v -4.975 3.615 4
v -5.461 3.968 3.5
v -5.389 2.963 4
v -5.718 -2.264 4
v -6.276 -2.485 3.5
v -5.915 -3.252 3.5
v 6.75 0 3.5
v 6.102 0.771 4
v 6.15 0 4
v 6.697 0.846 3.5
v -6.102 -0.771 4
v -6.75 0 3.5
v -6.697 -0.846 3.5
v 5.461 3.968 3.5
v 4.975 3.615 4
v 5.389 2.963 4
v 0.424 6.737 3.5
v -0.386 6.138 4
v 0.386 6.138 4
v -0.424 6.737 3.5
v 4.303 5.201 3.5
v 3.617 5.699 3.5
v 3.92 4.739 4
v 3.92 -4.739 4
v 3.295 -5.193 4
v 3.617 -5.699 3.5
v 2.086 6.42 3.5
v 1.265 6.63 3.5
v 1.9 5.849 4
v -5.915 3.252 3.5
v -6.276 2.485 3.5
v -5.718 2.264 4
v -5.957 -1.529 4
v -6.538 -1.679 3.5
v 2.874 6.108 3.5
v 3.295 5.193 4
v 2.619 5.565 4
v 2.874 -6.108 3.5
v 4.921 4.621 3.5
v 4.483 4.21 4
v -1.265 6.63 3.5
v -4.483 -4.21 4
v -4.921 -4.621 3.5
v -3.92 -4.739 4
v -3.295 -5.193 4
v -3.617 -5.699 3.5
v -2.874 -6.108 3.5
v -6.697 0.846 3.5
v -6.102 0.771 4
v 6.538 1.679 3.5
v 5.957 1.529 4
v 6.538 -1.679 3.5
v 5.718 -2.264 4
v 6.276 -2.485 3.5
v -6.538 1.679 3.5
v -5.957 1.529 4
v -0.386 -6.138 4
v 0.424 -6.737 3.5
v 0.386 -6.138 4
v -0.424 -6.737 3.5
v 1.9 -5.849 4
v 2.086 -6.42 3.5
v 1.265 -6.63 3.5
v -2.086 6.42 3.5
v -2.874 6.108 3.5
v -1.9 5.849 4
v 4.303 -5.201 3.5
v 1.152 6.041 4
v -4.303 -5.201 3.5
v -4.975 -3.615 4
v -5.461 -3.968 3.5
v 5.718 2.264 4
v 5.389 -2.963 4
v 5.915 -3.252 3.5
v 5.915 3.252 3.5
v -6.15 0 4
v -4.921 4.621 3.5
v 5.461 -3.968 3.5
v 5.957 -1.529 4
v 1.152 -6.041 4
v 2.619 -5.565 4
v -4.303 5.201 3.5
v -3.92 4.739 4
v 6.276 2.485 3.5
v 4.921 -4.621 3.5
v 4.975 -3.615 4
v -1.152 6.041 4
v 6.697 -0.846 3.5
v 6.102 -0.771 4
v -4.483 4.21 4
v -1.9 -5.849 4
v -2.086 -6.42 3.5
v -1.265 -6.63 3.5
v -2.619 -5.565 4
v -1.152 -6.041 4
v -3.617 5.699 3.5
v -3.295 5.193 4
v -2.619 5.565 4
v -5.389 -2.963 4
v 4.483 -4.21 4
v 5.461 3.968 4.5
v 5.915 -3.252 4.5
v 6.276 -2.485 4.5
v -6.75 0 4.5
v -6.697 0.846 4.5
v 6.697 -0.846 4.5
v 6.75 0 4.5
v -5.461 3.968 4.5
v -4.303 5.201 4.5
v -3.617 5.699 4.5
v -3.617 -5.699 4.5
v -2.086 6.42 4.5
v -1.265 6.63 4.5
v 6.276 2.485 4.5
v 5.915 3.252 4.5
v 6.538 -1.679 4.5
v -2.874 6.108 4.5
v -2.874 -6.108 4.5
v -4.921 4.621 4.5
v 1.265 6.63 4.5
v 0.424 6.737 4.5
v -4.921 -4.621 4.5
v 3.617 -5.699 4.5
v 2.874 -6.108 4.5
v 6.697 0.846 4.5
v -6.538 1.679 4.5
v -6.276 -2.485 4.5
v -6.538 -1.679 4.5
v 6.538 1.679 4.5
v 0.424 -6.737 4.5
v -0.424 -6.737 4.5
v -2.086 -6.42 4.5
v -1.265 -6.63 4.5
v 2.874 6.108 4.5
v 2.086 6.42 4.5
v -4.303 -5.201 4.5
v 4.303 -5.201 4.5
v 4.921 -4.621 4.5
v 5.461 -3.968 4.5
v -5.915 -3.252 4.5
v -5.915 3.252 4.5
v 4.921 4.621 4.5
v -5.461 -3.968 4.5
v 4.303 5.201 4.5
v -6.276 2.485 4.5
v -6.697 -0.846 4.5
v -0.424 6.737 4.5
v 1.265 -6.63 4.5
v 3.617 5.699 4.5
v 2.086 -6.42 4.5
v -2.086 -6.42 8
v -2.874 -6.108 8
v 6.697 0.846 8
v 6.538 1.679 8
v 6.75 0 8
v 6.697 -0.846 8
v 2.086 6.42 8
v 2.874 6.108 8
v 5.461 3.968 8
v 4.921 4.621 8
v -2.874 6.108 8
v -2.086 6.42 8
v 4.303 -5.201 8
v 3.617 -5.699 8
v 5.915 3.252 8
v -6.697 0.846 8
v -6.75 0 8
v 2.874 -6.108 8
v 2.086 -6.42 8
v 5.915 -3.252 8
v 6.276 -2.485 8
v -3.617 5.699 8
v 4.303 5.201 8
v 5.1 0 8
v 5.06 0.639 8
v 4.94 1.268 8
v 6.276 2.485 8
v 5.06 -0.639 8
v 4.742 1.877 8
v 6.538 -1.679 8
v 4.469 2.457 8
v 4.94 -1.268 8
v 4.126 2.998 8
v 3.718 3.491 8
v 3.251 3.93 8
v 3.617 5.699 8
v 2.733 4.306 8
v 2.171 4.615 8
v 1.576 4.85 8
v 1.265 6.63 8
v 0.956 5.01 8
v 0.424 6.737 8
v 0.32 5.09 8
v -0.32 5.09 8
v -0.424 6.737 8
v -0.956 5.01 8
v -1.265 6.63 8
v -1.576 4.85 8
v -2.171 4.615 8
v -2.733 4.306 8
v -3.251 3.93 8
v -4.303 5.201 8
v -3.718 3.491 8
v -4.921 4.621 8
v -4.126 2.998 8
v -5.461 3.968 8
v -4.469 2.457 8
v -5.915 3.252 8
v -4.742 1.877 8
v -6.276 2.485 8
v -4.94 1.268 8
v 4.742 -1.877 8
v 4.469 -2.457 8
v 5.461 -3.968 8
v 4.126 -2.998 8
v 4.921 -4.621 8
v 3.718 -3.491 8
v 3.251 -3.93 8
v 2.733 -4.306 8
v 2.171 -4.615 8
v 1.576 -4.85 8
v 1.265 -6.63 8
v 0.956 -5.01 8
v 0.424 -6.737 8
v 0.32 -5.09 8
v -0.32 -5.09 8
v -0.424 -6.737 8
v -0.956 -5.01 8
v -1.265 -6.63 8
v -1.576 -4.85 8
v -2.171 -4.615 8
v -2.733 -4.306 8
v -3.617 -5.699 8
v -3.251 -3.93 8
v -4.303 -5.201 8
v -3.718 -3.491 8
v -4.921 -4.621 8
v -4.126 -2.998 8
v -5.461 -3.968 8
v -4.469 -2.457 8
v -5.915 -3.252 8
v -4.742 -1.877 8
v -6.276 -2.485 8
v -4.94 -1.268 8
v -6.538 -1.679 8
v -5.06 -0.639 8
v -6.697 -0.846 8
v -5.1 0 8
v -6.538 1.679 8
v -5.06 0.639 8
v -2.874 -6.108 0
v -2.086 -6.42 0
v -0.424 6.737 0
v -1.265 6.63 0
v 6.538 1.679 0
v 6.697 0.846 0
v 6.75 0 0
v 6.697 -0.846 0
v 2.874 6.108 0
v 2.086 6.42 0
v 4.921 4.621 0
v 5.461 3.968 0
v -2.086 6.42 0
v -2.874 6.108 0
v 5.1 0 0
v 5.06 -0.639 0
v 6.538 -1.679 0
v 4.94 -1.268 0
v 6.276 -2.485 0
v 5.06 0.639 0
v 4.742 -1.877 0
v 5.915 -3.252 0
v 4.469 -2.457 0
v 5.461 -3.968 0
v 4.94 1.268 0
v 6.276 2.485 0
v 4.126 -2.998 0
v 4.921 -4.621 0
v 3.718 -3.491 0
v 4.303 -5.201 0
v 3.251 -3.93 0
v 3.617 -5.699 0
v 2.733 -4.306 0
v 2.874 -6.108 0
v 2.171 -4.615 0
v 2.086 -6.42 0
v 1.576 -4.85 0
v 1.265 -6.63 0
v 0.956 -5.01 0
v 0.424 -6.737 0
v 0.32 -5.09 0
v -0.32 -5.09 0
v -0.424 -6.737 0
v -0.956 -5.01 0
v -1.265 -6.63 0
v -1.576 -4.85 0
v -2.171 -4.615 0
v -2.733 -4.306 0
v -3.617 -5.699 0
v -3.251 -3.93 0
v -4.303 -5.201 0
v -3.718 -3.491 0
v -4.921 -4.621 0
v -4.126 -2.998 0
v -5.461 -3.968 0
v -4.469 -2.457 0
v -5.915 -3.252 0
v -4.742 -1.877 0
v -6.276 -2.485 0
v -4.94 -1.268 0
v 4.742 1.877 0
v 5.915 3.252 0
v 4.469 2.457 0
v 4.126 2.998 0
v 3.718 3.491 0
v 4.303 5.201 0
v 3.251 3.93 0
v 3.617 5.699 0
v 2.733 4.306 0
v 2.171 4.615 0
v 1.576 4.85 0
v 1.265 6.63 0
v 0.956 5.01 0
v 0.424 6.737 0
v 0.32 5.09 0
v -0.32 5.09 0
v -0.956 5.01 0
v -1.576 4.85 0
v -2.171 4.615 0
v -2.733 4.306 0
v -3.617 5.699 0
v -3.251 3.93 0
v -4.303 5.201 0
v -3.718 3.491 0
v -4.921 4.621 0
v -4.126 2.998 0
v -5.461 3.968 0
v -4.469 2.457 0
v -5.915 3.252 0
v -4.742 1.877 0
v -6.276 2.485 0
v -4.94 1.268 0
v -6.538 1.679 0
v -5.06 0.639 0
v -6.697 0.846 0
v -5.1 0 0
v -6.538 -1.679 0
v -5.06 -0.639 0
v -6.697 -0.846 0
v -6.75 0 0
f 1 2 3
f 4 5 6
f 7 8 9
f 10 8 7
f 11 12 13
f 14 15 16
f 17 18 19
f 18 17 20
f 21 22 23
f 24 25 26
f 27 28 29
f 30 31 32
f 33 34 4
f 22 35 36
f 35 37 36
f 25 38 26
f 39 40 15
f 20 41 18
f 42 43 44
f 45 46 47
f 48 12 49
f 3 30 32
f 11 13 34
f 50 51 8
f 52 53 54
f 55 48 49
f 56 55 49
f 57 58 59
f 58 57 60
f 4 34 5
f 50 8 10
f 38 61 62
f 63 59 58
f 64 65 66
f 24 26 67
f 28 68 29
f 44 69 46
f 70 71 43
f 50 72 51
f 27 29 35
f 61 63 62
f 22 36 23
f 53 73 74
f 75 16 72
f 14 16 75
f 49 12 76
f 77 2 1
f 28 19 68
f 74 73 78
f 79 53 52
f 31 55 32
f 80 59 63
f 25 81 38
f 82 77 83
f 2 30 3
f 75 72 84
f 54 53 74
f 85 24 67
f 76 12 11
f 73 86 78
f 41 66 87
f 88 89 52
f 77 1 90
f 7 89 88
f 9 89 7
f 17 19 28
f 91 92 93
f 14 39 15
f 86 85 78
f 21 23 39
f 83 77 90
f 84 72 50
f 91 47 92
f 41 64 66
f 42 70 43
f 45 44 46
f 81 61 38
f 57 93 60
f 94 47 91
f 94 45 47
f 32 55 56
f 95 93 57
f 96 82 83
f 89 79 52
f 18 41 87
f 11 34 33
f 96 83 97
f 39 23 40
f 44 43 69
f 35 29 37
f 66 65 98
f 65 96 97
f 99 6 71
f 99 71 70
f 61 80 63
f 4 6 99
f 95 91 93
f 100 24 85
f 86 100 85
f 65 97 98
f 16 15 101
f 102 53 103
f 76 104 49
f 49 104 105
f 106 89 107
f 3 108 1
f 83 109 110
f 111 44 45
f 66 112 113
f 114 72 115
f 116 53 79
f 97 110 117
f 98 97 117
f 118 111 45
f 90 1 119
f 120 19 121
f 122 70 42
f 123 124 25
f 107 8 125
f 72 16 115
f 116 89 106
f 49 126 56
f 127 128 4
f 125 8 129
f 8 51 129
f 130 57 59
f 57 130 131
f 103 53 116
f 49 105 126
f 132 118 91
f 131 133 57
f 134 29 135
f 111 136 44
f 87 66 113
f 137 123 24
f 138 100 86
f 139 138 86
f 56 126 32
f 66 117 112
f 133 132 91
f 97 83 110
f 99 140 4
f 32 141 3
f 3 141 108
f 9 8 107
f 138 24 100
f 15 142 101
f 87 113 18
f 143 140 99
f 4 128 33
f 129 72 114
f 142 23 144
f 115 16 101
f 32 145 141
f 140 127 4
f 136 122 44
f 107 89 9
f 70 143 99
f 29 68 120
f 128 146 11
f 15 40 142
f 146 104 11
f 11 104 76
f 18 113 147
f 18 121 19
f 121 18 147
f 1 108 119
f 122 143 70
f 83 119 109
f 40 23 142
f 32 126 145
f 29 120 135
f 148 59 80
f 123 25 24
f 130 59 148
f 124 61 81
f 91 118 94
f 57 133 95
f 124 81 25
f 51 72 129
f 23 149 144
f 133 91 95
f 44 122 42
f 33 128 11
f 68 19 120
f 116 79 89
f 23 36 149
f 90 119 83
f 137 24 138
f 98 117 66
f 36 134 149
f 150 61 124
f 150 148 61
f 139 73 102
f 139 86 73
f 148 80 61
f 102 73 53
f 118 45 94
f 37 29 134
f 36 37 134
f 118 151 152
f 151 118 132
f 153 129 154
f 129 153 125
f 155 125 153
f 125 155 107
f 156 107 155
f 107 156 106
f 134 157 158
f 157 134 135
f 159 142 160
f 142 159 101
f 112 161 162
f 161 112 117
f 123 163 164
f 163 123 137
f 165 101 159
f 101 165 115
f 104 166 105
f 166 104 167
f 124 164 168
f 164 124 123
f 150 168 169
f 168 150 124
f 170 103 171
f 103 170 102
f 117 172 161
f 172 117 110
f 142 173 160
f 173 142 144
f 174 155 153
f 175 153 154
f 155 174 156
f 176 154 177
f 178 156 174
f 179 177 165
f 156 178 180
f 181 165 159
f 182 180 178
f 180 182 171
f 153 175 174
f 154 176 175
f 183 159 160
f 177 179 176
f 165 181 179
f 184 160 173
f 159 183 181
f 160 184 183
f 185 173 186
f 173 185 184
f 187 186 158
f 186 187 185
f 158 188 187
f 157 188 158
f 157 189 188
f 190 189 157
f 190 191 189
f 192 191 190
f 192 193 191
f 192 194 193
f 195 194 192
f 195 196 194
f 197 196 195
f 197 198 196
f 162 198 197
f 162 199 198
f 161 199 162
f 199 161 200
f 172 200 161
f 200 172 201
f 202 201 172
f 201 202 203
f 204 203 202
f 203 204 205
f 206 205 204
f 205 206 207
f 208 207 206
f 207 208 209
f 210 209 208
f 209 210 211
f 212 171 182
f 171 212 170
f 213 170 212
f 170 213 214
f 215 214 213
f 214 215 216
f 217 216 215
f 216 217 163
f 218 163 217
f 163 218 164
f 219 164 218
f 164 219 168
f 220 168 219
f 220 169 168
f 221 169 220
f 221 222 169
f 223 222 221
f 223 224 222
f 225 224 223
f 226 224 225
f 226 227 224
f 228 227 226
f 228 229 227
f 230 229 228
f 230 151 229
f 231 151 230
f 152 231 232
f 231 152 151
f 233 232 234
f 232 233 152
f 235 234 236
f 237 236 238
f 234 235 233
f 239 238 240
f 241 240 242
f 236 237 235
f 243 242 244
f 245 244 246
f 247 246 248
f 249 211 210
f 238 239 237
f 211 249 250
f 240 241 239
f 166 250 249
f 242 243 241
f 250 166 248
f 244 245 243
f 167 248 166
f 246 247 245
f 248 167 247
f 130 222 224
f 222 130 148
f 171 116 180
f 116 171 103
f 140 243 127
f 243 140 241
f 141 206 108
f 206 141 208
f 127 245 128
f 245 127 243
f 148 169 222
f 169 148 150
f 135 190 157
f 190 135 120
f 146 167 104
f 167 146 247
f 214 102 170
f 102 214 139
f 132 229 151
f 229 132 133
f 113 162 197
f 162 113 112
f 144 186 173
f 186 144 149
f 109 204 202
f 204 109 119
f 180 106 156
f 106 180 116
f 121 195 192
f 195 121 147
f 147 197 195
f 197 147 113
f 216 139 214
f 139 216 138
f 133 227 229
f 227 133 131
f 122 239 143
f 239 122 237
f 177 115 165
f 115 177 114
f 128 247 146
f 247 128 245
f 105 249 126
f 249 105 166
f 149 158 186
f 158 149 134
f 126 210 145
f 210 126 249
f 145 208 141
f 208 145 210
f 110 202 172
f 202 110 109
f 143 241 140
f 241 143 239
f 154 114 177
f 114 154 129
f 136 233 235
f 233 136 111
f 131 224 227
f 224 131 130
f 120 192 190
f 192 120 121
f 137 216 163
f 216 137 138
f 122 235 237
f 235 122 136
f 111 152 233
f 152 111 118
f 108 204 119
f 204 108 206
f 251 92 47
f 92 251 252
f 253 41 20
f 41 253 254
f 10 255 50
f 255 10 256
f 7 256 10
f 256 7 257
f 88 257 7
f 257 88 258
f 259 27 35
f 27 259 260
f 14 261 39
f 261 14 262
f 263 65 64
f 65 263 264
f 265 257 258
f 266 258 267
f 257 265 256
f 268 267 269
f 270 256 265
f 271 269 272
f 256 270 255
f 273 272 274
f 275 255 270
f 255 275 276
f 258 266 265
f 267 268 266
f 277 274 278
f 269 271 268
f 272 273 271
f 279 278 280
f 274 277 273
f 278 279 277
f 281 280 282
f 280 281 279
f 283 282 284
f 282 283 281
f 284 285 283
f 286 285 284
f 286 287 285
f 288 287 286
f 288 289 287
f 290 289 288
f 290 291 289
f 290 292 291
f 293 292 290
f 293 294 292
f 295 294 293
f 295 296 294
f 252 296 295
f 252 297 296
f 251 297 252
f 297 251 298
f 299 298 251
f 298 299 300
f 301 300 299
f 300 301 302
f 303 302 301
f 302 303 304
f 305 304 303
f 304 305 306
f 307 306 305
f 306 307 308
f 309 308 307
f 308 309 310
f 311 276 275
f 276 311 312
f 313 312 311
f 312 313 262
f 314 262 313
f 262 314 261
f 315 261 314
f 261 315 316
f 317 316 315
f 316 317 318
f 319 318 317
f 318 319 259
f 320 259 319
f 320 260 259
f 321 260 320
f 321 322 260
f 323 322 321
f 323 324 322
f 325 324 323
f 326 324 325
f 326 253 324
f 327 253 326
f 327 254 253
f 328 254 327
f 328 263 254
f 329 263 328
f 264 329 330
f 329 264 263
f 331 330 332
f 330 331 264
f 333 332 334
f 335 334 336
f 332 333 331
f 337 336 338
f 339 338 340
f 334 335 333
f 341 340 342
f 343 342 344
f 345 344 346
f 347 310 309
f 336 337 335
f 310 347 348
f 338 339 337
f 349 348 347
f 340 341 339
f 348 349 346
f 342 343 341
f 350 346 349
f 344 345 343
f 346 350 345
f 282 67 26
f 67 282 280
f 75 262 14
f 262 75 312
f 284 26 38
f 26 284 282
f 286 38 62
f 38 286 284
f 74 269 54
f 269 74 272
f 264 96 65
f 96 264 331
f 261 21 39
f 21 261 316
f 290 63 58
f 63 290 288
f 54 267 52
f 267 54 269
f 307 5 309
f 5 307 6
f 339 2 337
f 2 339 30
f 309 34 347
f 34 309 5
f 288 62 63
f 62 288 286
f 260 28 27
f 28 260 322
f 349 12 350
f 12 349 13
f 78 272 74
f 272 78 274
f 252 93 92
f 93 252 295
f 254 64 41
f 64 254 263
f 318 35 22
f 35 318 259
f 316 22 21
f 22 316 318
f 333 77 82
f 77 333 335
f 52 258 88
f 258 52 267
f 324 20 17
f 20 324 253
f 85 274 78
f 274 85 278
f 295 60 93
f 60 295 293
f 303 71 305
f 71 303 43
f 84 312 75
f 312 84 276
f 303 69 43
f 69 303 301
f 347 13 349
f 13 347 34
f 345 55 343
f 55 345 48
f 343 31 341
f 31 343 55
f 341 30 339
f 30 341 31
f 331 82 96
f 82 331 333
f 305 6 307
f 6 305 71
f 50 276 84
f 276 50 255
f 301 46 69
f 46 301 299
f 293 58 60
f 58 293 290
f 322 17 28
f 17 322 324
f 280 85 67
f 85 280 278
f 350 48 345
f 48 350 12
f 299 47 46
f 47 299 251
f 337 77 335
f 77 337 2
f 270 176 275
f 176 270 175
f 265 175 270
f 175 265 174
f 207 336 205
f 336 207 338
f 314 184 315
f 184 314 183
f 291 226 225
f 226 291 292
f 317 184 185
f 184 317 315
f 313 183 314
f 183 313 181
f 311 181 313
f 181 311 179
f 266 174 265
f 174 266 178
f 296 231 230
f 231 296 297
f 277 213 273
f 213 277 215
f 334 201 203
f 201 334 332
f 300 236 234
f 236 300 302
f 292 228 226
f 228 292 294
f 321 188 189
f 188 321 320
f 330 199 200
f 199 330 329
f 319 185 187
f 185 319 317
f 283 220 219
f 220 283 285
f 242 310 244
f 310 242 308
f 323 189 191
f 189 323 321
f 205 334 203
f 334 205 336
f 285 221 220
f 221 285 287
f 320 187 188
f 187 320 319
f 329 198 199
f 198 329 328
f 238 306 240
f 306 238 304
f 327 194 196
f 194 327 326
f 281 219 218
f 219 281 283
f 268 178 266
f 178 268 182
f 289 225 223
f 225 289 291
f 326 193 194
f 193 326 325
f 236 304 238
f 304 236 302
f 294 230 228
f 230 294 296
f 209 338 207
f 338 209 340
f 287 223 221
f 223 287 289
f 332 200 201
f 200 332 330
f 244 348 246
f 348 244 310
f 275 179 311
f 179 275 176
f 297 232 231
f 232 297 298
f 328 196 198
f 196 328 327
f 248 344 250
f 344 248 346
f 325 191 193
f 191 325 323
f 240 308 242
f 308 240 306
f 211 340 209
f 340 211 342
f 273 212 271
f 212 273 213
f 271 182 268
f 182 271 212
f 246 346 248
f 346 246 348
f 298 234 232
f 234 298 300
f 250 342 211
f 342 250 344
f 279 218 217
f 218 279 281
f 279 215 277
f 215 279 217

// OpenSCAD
outerDia = 13.5;

innerDia = 10.2;

grooveDia = 12.3;

grooveHeight = 1;

overallHeight = 8;

module pulley(outerDia, innerDia, midDia, midHeight, height){
    difference(){
        union(){
            translate([0,0,(height-midHeight)/2]) cylinder(h=midHeight/2, r1=outerDia/2, r2=midDia/2,$fn=50);
            translate([0,0,midHeight+(height-midHeight)/2]) rotate([0,180,0]) cylinder(h=midHeight/2, r1=outerDia/2, r2=midDia/2,$fn=50);
            translate([0,0,midHeight+(height-midHeight)/2]) cylinder(h=(height-midHeight)/2, r=outerDia/2,$fn=50);
            translate([0,0,0]) cylinder(h=(height-midHeight)/2, r=outerDia/2,$fn=50);
        }
        translate([0,0,-0.01]) cylinder(h=height+0.02,r=innerDia/2,$fn=50);
    }
}
     // OD   ID  MD  MH, H
pulley(outerDia, innerDia, grooveDia, grooveHeight, overallHeight);
